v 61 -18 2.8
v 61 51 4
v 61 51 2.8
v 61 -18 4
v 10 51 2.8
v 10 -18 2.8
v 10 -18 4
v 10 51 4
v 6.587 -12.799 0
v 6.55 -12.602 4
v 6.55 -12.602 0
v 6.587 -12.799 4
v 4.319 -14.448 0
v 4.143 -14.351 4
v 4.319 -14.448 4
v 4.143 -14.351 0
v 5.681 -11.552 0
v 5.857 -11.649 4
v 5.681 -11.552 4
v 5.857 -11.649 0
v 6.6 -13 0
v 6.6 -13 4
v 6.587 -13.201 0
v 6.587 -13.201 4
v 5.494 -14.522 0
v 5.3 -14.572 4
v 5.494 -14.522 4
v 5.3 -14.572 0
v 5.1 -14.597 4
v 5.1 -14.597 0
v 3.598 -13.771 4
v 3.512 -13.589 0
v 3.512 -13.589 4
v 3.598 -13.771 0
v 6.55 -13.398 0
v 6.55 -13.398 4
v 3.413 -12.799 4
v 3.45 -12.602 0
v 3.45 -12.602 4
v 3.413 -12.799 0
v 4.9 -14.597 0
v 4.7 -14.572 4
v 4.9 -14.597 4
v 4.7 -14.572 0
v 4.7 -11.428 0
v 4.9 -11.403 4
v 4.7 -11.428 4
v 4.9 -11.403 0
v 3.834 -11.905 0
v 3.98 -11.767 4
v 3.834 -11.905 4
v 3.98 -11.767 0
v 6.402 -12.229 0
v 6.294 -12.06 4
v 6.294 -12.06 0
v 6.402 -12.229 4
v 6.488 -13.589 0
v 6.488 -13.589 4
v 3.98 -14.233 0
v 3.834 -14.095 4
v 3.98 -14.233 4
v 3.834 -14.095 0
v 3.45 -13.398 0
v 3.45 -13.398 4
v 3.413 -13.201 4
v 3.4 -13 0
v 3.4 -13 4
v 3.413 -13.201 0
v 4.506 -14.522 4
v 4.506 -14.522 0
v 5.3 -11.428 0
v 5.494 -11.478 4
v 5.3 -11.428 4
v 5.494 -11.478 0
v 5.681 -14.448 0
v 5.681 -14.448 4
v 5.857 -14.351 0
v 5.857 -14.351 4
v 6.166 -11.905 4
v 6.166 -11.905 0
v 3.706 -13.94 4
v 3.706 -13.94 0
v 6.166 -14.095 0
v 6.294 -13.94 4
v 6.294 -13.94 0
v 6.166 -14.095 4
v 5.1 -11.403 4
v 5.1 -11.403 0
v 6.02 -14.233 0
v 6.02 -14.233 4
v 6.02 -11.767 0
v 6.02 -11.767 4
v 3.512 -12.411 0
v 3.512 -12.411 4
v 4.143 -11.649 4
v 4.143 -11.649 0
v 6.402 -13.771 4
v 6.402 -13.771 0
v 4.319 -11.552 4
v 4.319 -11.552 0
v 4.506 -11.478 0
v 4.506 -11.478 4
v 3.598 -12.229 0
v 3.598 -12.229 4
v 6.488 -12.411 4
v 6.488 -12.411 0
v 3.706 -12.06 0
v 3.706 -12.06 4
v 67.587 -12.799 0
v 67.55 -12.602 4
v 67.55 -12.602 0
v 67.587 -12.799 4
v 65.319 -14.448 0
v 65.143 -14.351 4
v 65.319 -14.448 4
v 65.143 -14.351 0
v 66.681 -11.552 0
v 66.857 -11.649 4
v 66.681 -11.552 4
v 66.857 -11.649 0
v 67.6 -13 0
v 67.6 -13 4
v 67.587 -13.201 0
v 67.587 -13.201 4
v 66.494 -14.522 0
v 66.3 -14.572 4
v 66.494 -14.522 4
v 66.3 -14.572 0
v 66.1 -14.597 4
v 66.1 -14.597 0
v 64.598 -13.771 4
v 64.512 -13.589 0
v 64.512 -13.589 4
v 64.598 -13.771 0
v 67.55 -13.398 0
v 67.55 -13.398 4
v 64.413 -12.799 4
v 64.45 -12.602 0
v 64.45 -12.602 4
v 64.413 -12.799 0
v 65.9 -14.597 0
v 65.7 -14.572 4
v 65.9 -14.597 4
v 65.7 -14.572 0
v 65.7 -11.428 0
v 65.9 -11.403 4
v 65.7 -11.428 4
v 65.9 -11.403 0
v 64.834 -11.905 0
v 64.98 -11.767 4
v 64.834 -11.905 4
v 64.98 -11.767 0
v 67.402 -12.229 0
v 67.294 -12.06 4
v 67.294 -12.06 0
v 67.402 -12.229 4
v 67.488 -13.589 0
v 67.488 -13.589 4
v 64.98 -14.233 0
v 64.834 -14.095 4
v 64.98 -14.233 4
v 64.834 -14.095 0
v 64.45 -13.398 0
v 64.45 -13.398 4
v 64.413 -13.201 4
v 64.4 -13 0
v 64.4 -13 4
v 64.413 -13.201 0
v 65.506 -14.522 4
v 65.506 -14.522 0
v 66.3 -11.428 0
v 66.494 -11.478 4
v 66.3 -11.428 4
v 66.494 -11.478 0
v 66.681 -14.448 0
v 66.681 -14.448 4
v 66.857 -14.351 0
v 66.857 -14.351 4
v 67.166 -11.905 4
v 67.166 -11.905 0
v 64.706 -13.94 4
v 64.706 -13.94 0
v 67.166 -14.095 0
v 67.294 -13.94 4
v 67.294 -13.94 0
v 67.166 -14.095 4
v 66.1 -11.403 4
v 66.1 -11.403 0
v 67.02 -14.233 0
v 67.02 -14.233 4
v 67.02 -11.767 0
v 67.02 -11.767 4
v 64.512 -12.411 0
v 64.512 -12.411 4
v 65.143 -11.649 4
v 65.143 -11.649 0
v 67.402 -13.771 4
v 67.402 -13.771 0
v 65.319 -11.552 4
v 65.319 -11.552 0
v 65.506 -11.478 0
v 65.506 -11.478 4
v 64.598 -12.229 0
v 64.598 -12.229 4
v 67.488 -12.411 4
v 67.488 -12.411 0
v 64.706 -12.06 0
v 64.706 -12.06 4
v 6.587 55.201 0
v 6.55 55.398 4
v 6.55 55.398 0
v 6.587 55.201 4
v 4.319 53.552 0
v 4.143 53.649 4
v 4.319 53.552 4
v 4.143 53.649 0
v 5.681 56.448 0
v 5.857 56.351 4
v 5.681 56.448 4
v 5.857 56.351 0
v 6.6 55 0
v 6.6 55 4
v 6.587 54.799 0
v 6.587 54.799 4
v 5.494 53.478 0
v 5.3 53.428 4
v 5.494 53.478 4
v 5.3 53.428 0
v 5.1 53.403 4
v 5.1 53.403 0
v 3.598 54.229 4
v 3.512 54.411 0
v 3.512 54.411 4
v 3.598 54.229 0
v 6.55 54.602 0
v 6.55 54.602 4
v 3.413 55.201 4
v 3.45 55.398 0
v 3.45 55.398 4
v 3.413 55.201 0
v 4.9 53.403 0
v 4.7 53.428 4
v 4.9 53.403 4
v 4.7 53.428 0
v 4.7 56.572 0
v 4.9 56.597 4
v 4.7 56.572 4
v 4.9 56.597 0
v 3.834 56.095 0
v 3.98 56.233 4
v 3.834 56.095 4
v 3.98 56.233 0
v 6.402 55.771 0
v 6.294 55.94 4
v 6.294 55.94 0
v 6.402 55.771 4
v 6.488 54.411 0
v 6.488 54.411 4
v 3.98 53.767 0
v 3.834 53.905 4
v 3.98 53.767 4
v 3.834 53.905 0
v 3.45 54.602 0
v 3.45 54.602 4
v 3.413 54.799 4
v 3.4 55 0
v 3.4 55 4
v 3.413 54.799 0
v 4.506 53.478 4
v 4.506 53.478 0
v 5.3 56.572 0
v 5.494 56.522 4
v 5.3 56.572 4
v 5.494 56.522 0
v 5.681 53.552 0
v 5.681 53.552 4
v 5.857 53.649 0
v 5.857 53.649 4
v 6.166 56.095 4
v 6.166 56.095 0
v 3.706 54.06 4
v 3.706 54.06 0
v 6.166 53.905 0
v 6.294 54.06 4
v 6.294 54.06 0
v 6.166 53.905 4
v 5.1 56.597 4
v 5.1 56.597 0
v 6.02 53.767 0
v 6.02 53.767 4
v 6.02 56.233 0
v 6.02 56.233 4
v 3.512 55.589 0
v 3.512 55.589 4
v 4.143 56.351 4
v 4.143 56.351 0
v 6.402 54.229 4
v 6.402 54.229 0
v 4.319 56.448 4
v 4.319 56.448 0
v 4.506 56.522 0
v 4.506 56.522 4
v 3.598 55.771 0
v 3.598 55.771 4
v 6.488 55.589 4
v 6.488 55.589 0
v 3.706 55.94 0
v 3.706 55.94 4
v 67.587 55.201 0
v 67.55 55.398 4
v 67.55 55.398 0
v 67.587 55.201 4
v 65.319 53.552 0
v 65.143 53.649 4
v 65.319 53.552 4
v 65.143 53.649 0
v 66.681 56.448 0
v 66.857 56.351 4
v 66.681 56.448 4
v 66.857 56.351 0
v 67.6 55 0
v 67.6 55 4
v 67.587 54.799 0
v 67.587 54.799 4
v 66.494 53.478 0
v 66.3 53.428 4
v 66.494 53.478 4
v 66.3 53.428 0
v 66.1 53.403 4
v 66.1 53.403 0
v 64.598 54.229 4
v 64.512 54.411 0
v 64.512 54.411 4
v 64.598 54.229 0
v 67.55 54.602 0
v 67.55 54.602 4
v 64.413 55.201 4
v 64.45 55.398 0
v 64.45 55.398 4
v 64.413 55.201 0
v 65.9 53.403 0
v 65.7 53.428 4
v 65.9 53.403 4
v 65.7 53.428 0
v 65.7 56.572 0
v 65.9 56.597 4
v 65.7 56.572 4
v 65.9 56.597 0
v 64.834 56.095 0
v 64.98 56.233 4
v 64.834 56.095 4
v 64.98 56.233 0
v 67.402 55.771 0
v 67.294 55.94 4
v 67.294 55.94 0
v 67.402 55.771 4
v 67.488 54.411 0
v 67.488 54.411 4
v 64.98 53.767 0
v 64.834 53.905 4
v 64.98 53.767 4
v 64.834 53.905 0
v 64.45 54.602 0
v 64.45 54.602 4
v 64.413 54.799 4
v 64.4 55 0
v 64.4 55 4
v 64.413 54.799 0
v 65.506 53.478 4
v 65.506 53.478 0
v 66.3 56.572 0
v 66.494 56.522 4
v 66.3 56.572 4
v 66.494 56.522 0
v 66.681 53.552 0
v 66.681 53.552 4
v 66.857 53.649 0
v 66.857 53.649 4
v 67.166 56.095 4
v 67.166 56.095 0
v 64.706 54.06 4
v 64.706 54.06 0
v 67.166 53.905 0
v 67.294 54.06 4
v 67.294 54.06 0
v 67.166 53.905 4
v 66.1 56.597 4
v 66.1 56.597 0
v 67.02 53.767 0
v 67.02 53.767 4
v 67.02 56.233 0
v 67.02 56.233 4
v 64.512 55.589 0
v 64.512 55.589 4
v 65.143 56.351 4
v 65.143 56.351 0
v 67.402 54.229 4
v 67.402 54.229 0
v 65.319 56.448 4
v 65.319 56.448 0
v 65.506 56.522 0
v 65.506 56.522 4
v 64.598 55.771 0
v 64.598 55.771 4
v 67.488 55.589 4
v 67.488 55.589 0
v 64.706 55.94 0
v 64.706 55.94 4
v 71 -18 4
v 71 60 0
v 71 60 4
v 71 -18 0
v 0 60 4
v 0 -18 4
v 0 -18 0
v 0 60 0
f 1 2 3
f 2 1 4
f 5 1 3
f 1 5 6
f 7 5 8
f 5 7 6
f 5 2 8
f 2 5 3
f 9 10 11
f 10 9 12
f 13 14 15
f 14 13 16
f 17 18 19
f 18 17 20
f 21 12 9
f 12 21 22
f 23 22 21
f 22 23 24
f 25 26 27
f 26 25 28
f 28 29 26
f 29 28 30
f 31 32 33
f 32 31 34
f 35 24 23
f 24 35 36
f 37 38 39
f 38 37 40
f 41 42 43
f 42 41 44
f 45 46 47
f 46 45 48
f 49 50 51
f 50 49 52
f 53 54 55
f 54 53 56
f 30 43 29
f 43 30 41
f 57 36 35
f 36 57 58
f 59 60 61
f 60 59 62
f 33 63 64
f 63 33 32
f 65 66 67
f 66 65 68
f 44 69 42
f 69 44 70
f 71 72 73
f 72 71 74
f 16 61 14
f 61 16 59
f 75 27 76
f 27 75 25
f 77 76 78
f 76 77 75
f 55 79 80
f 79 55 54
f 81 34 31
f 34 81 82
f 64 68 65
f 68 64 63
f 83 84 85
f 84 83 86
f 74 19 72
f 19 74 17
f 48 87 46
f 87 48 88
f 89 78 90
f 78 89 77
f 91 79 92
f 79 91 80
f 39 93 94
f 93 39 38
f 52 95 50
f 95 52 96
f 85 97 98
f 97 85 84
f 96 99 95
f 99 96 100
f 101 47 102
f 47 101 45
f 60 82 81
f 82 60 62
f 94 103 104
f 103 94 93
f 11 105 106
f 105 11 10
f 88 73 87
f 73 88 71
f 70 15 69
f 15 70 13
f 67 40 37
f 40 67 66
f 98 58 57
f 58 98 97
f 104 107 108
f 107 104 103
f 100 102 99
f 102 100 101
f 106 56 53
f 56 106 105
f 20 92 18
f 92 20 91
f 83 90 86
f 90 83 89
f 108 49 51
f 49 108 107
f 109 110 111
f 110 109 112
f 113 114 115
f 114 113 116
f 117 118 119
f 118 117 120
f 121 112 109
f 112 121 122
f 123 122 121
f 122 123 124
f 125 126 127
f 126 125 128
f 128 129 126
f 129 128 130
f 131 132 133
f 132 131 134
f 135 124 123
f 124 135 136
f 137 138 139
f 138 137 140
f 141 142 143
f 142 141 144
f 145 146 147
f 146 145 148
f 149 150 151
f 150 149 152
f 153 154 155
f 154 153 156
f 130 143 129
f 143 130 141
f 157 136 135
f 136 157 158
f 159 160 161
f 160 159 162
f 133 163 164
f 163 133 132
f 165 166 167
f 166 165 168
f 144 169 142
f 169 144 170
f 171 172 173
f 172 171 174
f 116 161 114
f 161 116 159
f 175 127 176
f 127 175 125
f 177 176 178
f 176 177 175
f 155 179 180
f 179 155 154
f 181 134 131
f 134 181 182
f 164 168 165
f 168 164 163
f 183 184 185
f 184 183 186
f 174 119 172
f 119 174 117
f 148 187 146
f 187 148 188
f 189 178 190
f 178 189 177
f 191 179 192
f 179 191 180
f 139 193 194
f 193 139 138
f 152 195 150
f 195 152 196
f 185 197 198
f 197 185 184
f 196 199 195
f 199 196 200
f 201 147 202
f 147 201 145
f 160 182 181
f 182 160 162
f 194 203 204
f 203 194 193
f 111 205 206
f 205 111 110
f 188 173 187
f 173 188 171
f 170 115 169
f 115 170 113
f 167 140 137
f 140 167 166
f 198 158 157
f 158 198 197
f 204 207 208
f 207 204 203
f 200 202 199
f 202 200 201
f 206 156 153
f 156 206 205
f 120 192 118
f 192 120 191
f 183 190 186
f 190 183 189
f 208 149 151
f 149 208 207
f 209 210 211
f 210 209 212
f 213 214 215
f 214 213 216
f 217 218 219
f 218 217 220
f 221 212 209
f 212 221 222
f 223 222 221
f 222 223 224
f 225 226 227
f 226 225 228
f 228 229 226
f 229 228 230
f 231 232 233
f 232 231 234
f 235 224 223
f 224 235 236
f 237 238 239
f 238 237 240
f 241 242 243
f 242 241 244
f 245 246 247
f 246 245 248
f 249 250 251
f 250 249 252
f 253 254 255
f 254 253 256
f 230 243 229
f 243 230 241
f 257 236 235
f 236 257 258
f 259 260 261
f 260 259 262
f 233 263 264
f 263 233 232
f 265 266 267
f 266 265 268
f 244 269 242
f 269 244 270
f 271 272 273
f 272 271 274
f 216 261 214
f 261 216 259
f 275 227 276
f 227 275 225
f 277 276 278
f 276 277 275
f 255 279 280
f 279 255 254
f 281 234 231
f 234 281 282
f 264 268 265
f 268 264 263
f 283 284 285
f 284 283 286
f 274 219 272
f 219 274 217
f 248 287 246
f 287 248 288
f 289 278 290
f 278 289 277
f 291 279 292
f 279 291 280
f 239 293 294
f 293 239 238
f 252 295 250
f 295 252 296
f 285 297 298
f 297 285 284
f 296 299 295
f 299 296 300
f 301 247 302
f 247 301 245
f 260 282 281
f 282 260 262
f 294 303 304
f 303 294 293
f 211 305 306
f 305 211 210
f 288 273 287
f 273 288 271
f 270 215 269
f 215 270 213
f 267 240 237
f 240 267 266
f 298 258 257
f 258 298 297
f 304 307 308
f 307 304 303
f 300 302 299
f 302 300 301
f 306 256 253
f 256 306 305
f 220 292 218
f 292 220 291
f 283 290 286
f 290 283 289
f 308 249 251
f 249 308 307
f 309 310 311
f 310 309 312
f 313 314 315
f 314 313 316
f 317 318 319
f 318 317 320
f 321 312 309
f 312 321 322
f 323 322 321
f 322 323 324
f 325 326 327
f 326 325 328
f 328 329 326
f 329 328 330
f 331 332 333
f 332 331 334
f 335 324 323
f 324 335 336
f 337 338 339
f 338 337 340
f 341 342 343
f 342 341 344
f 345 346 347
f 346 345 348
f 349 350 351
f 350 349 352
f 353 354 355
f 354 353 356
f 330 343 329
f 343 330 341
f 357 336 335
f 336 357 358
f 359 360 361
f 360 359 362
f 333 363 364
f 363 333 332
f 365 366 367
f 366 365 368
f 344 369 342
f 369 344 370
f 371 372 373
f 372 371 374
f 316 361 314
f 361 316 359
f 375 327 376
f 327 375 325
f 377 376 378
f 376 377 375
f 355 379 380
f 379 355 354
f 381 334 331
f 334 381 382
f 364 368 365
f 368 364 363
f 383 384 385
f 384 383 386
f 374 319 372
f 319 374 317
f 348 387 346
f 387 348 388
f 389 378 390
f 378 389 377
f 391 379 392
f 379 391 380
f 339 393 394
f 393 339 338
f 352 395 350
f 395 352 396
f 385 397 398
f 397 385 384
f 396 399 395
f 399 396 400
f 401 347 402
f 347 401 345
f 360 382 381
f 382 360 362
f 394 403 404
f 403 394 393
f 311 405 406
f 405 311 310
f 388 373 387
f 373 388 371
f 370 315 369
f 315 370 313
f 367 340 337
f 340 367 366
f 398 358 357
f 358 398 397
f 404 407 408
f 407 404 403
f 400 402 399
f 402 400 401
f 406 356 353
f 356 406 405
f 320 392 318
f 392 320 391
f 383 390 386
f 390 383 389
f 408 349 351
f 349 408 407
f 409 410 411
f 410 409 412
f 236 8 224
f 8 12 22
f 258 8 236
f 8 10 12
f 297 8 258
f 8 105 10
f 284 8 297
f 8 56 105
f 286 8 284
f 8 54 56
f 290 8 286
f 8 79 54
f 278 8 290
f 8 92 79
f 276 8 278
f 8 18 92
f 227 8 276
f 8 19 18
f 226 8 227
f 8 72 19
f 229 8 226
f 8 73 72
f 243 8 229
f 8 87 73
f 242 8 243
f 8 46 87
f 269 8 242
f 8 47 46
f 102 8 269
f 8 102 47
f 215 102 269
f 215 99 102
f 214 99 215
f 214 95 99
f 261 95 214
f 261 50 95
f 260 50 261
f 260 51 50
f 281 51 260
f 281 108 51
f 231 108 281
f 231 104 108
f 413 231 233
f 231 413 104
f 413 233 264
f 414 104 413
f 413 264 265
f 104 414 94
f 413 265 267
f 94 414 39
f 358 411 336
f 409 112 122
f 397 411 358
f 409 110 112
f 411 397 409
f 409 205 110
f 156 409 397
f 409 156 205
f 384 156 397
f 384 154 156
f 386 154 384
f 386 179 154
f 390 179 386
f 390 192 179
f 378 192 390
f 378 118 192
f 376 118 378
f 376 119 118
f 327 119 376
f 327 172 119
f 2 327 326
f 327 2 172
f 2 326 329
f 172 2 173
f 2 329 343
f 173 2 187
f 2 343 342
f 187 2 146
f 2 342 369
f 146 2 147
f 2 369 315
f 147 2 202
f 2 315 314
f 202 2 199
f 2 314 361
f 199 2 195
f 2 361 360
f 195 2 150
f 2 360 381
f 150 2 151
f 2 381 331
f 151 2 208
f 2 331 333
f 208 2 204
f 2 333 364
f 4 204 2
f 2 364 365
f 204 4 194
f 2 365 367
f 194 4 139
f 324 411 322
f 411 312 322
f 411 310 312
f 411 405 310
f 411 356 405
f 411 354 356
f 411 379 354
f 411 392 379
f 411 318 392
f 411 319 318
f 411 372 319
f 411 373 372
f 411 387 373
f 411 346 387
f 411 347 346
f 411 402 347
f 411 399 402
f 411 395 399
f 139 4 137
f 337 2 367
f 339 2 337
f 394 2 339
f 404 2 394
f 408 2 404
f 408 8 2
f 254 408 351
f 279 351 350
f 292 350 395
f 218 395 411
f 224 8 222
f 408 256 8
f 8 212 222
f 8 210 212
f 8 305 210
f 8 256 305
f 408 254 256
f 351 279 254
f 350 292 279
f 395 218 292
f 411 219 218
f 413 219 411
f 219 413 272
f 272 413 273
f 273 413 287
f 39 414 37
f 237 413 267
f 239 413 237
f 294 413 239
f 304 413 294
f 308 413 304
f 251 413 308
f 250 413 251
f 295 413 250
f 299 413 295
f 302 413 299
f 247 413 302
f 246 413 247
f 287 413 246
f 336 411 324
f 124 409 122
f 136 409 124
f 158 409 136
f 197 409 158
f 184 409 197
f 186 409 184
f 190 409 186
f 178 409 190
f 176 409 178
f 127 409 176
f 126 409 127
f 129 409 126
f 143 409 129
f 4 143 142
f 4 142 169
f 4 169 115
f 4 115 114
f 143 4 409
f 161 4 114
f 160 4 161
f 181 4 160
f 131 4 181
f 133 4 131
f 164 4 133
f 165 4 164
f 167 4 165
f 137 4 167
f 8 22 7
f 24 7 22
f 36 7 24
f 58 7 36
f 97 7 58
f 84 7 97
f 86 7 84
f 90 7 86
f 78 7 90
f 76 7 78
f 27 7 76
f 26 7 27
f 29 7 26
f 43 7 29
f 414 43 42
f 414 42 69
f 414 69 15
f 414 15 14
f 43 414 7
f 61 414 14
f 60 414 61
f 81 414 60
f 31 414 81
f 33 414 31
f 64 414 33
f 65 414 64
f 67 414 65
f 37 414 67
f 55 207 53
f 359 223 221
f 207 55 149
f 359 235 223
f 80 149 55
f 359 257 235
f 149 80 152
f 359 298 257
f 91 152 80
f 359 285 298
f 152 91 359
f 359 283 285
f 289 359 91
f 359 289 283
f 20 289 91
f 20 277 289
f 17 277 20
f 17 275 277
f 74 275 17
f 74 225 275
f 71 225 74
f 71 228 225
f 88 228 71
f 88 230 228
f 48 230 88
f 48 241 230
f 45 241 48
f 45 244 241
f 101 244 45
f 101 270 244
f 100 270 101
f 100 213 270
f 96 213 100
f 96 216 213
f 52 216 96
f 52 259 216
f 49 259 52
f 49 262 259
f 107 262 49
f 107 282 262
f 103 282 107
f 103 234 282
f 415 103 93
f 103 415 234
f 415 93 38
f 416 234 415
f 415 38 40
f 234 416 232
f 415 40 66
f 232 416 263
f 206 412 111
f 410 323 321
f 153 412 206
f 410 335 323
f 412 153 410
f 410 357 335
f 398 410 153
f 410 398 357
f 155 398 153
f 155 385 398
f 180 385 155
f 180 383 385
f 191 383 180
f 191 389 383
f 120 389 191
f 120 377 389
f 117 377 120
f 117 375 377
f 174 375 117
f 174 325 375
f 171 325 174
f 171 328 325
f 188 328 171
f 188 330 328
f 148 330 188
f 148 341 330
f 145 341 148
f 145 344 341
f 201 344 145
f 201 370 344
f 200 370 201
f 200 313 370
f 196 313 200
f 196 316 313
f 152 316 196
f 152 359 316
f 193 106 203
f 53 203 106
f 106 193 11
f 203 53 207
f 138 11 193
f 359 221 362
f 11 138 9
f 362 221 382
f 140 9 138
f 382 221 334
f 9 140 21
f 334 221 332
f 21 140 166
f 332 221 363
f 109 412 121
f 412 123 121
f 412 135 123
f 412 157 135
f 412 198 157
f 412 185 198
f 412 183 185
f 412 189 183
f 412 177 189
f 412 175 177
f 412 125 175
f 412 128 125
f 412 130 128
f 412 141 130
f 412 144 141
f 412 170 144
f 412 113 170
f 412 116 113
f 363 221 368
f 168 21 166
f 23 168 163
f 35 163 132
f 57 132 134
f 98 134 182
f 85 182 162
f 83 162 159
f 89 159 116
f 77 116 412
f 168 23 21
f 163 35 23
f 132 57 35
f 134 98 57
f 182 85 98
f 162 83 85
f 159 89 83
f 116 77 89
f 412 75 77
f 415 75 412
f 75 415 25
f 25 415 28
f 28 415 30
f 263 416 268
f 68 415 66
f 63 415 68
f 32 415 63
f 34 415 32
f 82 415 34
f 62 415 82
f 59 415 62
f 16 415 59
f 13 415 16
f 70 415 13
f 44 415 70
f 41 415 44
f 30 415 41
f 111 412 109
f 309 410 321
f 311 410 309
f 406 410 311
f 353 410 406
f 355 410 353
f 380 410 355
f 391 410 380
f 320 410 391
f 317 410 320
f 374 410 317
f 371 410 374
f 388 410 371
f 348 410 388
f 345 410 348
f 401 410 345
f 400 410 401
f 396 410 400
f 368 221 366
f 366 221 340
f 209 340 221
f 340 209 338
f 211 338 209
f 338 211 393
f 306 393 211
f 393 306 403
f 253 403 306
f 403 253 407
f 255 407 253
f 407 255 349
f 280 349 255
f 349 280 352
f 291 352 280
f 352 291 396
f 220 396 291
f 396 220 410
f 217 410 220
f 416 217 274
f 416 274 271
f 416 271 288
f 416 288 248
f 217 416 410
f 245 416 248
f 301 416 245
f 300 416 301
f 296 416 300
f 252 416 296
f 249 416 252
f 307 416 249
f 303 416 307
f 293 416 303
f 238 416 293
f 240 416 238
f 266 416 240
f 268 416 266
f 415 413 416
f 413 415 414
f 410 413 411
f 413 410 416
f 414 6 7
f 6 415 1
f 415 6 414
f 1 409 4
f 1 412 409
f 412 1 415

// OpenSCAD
module tube(diameter, length) {
  radius = diameter / 2;
  linear_extrude(height = length)
  circle(r = radius);
}

module screwHoles(width, breadth, diameter) {
  translate([0,0,-0.1]){
    translate([0,0,0])
    tube(diameter,10);
    translate([width,0,0])
    tube(diameter,10);
    translate([0,breadth,0])
    tube(diameter,10);
    translate([width,breadth,0])
    tube(diameter,10);
  }
}

module pcb(size=pcbSize){
  cube([size,size,2]);
}

module pcbWithHoles(size){
  holeClearance = 2.8;
  holeDistance= size - (2 * holeClearance);

  color("red")
  difference(){
    pcb(size);
    translate([holeClearance, holeClearance, 0])
    screwHoles(holeDistance, holeDistance, 3);
  }
}

module base(breadth=78){
  width=pcbSize+2*10;
  height=4;

  translate([0,60-breadth,0])
  difference(){
    cube([width,breadth,height]);
    translate([10,breadth-60, height-1.2])
    color("black")
    union() {
      pcb();
      translate([0,-49.9,0])
      pcb();
    }
    translate([5,5,0])
    screwHoles(width-10, breadth-10, screwDiamter);
  }
}


module top(breadth=78){
  width=pcbSize+2*10;
  hole = pcbSize-10;
  height=5;

  translate([0,60-breadth,0])
  union(){
    difference(){
      cube([width,breadth,height]);
      translate([15,-15, -1])
      color("black")
      cube([hole,breadth, 10]);
      translate([5,5,0])
      screwHoles(width-10, breadth-10, screwDiamter);
    }
    translate([2,14, 1.99])
    color("blue")
    cube([width-4,8, 3]);

  }
}

$fn=50;
pcbSize=51;
screwDiamter=3.2;

//top();
base(78);
/*
translate([20+pcbSize,0,0])
rotate([0,0,180])
base(42);

translate([10,0, 3]) {
  pcbWithHoles(50);
  translate([0,-( 50 + 0.1),0])
  pcbWithHoles(50);
}*/
